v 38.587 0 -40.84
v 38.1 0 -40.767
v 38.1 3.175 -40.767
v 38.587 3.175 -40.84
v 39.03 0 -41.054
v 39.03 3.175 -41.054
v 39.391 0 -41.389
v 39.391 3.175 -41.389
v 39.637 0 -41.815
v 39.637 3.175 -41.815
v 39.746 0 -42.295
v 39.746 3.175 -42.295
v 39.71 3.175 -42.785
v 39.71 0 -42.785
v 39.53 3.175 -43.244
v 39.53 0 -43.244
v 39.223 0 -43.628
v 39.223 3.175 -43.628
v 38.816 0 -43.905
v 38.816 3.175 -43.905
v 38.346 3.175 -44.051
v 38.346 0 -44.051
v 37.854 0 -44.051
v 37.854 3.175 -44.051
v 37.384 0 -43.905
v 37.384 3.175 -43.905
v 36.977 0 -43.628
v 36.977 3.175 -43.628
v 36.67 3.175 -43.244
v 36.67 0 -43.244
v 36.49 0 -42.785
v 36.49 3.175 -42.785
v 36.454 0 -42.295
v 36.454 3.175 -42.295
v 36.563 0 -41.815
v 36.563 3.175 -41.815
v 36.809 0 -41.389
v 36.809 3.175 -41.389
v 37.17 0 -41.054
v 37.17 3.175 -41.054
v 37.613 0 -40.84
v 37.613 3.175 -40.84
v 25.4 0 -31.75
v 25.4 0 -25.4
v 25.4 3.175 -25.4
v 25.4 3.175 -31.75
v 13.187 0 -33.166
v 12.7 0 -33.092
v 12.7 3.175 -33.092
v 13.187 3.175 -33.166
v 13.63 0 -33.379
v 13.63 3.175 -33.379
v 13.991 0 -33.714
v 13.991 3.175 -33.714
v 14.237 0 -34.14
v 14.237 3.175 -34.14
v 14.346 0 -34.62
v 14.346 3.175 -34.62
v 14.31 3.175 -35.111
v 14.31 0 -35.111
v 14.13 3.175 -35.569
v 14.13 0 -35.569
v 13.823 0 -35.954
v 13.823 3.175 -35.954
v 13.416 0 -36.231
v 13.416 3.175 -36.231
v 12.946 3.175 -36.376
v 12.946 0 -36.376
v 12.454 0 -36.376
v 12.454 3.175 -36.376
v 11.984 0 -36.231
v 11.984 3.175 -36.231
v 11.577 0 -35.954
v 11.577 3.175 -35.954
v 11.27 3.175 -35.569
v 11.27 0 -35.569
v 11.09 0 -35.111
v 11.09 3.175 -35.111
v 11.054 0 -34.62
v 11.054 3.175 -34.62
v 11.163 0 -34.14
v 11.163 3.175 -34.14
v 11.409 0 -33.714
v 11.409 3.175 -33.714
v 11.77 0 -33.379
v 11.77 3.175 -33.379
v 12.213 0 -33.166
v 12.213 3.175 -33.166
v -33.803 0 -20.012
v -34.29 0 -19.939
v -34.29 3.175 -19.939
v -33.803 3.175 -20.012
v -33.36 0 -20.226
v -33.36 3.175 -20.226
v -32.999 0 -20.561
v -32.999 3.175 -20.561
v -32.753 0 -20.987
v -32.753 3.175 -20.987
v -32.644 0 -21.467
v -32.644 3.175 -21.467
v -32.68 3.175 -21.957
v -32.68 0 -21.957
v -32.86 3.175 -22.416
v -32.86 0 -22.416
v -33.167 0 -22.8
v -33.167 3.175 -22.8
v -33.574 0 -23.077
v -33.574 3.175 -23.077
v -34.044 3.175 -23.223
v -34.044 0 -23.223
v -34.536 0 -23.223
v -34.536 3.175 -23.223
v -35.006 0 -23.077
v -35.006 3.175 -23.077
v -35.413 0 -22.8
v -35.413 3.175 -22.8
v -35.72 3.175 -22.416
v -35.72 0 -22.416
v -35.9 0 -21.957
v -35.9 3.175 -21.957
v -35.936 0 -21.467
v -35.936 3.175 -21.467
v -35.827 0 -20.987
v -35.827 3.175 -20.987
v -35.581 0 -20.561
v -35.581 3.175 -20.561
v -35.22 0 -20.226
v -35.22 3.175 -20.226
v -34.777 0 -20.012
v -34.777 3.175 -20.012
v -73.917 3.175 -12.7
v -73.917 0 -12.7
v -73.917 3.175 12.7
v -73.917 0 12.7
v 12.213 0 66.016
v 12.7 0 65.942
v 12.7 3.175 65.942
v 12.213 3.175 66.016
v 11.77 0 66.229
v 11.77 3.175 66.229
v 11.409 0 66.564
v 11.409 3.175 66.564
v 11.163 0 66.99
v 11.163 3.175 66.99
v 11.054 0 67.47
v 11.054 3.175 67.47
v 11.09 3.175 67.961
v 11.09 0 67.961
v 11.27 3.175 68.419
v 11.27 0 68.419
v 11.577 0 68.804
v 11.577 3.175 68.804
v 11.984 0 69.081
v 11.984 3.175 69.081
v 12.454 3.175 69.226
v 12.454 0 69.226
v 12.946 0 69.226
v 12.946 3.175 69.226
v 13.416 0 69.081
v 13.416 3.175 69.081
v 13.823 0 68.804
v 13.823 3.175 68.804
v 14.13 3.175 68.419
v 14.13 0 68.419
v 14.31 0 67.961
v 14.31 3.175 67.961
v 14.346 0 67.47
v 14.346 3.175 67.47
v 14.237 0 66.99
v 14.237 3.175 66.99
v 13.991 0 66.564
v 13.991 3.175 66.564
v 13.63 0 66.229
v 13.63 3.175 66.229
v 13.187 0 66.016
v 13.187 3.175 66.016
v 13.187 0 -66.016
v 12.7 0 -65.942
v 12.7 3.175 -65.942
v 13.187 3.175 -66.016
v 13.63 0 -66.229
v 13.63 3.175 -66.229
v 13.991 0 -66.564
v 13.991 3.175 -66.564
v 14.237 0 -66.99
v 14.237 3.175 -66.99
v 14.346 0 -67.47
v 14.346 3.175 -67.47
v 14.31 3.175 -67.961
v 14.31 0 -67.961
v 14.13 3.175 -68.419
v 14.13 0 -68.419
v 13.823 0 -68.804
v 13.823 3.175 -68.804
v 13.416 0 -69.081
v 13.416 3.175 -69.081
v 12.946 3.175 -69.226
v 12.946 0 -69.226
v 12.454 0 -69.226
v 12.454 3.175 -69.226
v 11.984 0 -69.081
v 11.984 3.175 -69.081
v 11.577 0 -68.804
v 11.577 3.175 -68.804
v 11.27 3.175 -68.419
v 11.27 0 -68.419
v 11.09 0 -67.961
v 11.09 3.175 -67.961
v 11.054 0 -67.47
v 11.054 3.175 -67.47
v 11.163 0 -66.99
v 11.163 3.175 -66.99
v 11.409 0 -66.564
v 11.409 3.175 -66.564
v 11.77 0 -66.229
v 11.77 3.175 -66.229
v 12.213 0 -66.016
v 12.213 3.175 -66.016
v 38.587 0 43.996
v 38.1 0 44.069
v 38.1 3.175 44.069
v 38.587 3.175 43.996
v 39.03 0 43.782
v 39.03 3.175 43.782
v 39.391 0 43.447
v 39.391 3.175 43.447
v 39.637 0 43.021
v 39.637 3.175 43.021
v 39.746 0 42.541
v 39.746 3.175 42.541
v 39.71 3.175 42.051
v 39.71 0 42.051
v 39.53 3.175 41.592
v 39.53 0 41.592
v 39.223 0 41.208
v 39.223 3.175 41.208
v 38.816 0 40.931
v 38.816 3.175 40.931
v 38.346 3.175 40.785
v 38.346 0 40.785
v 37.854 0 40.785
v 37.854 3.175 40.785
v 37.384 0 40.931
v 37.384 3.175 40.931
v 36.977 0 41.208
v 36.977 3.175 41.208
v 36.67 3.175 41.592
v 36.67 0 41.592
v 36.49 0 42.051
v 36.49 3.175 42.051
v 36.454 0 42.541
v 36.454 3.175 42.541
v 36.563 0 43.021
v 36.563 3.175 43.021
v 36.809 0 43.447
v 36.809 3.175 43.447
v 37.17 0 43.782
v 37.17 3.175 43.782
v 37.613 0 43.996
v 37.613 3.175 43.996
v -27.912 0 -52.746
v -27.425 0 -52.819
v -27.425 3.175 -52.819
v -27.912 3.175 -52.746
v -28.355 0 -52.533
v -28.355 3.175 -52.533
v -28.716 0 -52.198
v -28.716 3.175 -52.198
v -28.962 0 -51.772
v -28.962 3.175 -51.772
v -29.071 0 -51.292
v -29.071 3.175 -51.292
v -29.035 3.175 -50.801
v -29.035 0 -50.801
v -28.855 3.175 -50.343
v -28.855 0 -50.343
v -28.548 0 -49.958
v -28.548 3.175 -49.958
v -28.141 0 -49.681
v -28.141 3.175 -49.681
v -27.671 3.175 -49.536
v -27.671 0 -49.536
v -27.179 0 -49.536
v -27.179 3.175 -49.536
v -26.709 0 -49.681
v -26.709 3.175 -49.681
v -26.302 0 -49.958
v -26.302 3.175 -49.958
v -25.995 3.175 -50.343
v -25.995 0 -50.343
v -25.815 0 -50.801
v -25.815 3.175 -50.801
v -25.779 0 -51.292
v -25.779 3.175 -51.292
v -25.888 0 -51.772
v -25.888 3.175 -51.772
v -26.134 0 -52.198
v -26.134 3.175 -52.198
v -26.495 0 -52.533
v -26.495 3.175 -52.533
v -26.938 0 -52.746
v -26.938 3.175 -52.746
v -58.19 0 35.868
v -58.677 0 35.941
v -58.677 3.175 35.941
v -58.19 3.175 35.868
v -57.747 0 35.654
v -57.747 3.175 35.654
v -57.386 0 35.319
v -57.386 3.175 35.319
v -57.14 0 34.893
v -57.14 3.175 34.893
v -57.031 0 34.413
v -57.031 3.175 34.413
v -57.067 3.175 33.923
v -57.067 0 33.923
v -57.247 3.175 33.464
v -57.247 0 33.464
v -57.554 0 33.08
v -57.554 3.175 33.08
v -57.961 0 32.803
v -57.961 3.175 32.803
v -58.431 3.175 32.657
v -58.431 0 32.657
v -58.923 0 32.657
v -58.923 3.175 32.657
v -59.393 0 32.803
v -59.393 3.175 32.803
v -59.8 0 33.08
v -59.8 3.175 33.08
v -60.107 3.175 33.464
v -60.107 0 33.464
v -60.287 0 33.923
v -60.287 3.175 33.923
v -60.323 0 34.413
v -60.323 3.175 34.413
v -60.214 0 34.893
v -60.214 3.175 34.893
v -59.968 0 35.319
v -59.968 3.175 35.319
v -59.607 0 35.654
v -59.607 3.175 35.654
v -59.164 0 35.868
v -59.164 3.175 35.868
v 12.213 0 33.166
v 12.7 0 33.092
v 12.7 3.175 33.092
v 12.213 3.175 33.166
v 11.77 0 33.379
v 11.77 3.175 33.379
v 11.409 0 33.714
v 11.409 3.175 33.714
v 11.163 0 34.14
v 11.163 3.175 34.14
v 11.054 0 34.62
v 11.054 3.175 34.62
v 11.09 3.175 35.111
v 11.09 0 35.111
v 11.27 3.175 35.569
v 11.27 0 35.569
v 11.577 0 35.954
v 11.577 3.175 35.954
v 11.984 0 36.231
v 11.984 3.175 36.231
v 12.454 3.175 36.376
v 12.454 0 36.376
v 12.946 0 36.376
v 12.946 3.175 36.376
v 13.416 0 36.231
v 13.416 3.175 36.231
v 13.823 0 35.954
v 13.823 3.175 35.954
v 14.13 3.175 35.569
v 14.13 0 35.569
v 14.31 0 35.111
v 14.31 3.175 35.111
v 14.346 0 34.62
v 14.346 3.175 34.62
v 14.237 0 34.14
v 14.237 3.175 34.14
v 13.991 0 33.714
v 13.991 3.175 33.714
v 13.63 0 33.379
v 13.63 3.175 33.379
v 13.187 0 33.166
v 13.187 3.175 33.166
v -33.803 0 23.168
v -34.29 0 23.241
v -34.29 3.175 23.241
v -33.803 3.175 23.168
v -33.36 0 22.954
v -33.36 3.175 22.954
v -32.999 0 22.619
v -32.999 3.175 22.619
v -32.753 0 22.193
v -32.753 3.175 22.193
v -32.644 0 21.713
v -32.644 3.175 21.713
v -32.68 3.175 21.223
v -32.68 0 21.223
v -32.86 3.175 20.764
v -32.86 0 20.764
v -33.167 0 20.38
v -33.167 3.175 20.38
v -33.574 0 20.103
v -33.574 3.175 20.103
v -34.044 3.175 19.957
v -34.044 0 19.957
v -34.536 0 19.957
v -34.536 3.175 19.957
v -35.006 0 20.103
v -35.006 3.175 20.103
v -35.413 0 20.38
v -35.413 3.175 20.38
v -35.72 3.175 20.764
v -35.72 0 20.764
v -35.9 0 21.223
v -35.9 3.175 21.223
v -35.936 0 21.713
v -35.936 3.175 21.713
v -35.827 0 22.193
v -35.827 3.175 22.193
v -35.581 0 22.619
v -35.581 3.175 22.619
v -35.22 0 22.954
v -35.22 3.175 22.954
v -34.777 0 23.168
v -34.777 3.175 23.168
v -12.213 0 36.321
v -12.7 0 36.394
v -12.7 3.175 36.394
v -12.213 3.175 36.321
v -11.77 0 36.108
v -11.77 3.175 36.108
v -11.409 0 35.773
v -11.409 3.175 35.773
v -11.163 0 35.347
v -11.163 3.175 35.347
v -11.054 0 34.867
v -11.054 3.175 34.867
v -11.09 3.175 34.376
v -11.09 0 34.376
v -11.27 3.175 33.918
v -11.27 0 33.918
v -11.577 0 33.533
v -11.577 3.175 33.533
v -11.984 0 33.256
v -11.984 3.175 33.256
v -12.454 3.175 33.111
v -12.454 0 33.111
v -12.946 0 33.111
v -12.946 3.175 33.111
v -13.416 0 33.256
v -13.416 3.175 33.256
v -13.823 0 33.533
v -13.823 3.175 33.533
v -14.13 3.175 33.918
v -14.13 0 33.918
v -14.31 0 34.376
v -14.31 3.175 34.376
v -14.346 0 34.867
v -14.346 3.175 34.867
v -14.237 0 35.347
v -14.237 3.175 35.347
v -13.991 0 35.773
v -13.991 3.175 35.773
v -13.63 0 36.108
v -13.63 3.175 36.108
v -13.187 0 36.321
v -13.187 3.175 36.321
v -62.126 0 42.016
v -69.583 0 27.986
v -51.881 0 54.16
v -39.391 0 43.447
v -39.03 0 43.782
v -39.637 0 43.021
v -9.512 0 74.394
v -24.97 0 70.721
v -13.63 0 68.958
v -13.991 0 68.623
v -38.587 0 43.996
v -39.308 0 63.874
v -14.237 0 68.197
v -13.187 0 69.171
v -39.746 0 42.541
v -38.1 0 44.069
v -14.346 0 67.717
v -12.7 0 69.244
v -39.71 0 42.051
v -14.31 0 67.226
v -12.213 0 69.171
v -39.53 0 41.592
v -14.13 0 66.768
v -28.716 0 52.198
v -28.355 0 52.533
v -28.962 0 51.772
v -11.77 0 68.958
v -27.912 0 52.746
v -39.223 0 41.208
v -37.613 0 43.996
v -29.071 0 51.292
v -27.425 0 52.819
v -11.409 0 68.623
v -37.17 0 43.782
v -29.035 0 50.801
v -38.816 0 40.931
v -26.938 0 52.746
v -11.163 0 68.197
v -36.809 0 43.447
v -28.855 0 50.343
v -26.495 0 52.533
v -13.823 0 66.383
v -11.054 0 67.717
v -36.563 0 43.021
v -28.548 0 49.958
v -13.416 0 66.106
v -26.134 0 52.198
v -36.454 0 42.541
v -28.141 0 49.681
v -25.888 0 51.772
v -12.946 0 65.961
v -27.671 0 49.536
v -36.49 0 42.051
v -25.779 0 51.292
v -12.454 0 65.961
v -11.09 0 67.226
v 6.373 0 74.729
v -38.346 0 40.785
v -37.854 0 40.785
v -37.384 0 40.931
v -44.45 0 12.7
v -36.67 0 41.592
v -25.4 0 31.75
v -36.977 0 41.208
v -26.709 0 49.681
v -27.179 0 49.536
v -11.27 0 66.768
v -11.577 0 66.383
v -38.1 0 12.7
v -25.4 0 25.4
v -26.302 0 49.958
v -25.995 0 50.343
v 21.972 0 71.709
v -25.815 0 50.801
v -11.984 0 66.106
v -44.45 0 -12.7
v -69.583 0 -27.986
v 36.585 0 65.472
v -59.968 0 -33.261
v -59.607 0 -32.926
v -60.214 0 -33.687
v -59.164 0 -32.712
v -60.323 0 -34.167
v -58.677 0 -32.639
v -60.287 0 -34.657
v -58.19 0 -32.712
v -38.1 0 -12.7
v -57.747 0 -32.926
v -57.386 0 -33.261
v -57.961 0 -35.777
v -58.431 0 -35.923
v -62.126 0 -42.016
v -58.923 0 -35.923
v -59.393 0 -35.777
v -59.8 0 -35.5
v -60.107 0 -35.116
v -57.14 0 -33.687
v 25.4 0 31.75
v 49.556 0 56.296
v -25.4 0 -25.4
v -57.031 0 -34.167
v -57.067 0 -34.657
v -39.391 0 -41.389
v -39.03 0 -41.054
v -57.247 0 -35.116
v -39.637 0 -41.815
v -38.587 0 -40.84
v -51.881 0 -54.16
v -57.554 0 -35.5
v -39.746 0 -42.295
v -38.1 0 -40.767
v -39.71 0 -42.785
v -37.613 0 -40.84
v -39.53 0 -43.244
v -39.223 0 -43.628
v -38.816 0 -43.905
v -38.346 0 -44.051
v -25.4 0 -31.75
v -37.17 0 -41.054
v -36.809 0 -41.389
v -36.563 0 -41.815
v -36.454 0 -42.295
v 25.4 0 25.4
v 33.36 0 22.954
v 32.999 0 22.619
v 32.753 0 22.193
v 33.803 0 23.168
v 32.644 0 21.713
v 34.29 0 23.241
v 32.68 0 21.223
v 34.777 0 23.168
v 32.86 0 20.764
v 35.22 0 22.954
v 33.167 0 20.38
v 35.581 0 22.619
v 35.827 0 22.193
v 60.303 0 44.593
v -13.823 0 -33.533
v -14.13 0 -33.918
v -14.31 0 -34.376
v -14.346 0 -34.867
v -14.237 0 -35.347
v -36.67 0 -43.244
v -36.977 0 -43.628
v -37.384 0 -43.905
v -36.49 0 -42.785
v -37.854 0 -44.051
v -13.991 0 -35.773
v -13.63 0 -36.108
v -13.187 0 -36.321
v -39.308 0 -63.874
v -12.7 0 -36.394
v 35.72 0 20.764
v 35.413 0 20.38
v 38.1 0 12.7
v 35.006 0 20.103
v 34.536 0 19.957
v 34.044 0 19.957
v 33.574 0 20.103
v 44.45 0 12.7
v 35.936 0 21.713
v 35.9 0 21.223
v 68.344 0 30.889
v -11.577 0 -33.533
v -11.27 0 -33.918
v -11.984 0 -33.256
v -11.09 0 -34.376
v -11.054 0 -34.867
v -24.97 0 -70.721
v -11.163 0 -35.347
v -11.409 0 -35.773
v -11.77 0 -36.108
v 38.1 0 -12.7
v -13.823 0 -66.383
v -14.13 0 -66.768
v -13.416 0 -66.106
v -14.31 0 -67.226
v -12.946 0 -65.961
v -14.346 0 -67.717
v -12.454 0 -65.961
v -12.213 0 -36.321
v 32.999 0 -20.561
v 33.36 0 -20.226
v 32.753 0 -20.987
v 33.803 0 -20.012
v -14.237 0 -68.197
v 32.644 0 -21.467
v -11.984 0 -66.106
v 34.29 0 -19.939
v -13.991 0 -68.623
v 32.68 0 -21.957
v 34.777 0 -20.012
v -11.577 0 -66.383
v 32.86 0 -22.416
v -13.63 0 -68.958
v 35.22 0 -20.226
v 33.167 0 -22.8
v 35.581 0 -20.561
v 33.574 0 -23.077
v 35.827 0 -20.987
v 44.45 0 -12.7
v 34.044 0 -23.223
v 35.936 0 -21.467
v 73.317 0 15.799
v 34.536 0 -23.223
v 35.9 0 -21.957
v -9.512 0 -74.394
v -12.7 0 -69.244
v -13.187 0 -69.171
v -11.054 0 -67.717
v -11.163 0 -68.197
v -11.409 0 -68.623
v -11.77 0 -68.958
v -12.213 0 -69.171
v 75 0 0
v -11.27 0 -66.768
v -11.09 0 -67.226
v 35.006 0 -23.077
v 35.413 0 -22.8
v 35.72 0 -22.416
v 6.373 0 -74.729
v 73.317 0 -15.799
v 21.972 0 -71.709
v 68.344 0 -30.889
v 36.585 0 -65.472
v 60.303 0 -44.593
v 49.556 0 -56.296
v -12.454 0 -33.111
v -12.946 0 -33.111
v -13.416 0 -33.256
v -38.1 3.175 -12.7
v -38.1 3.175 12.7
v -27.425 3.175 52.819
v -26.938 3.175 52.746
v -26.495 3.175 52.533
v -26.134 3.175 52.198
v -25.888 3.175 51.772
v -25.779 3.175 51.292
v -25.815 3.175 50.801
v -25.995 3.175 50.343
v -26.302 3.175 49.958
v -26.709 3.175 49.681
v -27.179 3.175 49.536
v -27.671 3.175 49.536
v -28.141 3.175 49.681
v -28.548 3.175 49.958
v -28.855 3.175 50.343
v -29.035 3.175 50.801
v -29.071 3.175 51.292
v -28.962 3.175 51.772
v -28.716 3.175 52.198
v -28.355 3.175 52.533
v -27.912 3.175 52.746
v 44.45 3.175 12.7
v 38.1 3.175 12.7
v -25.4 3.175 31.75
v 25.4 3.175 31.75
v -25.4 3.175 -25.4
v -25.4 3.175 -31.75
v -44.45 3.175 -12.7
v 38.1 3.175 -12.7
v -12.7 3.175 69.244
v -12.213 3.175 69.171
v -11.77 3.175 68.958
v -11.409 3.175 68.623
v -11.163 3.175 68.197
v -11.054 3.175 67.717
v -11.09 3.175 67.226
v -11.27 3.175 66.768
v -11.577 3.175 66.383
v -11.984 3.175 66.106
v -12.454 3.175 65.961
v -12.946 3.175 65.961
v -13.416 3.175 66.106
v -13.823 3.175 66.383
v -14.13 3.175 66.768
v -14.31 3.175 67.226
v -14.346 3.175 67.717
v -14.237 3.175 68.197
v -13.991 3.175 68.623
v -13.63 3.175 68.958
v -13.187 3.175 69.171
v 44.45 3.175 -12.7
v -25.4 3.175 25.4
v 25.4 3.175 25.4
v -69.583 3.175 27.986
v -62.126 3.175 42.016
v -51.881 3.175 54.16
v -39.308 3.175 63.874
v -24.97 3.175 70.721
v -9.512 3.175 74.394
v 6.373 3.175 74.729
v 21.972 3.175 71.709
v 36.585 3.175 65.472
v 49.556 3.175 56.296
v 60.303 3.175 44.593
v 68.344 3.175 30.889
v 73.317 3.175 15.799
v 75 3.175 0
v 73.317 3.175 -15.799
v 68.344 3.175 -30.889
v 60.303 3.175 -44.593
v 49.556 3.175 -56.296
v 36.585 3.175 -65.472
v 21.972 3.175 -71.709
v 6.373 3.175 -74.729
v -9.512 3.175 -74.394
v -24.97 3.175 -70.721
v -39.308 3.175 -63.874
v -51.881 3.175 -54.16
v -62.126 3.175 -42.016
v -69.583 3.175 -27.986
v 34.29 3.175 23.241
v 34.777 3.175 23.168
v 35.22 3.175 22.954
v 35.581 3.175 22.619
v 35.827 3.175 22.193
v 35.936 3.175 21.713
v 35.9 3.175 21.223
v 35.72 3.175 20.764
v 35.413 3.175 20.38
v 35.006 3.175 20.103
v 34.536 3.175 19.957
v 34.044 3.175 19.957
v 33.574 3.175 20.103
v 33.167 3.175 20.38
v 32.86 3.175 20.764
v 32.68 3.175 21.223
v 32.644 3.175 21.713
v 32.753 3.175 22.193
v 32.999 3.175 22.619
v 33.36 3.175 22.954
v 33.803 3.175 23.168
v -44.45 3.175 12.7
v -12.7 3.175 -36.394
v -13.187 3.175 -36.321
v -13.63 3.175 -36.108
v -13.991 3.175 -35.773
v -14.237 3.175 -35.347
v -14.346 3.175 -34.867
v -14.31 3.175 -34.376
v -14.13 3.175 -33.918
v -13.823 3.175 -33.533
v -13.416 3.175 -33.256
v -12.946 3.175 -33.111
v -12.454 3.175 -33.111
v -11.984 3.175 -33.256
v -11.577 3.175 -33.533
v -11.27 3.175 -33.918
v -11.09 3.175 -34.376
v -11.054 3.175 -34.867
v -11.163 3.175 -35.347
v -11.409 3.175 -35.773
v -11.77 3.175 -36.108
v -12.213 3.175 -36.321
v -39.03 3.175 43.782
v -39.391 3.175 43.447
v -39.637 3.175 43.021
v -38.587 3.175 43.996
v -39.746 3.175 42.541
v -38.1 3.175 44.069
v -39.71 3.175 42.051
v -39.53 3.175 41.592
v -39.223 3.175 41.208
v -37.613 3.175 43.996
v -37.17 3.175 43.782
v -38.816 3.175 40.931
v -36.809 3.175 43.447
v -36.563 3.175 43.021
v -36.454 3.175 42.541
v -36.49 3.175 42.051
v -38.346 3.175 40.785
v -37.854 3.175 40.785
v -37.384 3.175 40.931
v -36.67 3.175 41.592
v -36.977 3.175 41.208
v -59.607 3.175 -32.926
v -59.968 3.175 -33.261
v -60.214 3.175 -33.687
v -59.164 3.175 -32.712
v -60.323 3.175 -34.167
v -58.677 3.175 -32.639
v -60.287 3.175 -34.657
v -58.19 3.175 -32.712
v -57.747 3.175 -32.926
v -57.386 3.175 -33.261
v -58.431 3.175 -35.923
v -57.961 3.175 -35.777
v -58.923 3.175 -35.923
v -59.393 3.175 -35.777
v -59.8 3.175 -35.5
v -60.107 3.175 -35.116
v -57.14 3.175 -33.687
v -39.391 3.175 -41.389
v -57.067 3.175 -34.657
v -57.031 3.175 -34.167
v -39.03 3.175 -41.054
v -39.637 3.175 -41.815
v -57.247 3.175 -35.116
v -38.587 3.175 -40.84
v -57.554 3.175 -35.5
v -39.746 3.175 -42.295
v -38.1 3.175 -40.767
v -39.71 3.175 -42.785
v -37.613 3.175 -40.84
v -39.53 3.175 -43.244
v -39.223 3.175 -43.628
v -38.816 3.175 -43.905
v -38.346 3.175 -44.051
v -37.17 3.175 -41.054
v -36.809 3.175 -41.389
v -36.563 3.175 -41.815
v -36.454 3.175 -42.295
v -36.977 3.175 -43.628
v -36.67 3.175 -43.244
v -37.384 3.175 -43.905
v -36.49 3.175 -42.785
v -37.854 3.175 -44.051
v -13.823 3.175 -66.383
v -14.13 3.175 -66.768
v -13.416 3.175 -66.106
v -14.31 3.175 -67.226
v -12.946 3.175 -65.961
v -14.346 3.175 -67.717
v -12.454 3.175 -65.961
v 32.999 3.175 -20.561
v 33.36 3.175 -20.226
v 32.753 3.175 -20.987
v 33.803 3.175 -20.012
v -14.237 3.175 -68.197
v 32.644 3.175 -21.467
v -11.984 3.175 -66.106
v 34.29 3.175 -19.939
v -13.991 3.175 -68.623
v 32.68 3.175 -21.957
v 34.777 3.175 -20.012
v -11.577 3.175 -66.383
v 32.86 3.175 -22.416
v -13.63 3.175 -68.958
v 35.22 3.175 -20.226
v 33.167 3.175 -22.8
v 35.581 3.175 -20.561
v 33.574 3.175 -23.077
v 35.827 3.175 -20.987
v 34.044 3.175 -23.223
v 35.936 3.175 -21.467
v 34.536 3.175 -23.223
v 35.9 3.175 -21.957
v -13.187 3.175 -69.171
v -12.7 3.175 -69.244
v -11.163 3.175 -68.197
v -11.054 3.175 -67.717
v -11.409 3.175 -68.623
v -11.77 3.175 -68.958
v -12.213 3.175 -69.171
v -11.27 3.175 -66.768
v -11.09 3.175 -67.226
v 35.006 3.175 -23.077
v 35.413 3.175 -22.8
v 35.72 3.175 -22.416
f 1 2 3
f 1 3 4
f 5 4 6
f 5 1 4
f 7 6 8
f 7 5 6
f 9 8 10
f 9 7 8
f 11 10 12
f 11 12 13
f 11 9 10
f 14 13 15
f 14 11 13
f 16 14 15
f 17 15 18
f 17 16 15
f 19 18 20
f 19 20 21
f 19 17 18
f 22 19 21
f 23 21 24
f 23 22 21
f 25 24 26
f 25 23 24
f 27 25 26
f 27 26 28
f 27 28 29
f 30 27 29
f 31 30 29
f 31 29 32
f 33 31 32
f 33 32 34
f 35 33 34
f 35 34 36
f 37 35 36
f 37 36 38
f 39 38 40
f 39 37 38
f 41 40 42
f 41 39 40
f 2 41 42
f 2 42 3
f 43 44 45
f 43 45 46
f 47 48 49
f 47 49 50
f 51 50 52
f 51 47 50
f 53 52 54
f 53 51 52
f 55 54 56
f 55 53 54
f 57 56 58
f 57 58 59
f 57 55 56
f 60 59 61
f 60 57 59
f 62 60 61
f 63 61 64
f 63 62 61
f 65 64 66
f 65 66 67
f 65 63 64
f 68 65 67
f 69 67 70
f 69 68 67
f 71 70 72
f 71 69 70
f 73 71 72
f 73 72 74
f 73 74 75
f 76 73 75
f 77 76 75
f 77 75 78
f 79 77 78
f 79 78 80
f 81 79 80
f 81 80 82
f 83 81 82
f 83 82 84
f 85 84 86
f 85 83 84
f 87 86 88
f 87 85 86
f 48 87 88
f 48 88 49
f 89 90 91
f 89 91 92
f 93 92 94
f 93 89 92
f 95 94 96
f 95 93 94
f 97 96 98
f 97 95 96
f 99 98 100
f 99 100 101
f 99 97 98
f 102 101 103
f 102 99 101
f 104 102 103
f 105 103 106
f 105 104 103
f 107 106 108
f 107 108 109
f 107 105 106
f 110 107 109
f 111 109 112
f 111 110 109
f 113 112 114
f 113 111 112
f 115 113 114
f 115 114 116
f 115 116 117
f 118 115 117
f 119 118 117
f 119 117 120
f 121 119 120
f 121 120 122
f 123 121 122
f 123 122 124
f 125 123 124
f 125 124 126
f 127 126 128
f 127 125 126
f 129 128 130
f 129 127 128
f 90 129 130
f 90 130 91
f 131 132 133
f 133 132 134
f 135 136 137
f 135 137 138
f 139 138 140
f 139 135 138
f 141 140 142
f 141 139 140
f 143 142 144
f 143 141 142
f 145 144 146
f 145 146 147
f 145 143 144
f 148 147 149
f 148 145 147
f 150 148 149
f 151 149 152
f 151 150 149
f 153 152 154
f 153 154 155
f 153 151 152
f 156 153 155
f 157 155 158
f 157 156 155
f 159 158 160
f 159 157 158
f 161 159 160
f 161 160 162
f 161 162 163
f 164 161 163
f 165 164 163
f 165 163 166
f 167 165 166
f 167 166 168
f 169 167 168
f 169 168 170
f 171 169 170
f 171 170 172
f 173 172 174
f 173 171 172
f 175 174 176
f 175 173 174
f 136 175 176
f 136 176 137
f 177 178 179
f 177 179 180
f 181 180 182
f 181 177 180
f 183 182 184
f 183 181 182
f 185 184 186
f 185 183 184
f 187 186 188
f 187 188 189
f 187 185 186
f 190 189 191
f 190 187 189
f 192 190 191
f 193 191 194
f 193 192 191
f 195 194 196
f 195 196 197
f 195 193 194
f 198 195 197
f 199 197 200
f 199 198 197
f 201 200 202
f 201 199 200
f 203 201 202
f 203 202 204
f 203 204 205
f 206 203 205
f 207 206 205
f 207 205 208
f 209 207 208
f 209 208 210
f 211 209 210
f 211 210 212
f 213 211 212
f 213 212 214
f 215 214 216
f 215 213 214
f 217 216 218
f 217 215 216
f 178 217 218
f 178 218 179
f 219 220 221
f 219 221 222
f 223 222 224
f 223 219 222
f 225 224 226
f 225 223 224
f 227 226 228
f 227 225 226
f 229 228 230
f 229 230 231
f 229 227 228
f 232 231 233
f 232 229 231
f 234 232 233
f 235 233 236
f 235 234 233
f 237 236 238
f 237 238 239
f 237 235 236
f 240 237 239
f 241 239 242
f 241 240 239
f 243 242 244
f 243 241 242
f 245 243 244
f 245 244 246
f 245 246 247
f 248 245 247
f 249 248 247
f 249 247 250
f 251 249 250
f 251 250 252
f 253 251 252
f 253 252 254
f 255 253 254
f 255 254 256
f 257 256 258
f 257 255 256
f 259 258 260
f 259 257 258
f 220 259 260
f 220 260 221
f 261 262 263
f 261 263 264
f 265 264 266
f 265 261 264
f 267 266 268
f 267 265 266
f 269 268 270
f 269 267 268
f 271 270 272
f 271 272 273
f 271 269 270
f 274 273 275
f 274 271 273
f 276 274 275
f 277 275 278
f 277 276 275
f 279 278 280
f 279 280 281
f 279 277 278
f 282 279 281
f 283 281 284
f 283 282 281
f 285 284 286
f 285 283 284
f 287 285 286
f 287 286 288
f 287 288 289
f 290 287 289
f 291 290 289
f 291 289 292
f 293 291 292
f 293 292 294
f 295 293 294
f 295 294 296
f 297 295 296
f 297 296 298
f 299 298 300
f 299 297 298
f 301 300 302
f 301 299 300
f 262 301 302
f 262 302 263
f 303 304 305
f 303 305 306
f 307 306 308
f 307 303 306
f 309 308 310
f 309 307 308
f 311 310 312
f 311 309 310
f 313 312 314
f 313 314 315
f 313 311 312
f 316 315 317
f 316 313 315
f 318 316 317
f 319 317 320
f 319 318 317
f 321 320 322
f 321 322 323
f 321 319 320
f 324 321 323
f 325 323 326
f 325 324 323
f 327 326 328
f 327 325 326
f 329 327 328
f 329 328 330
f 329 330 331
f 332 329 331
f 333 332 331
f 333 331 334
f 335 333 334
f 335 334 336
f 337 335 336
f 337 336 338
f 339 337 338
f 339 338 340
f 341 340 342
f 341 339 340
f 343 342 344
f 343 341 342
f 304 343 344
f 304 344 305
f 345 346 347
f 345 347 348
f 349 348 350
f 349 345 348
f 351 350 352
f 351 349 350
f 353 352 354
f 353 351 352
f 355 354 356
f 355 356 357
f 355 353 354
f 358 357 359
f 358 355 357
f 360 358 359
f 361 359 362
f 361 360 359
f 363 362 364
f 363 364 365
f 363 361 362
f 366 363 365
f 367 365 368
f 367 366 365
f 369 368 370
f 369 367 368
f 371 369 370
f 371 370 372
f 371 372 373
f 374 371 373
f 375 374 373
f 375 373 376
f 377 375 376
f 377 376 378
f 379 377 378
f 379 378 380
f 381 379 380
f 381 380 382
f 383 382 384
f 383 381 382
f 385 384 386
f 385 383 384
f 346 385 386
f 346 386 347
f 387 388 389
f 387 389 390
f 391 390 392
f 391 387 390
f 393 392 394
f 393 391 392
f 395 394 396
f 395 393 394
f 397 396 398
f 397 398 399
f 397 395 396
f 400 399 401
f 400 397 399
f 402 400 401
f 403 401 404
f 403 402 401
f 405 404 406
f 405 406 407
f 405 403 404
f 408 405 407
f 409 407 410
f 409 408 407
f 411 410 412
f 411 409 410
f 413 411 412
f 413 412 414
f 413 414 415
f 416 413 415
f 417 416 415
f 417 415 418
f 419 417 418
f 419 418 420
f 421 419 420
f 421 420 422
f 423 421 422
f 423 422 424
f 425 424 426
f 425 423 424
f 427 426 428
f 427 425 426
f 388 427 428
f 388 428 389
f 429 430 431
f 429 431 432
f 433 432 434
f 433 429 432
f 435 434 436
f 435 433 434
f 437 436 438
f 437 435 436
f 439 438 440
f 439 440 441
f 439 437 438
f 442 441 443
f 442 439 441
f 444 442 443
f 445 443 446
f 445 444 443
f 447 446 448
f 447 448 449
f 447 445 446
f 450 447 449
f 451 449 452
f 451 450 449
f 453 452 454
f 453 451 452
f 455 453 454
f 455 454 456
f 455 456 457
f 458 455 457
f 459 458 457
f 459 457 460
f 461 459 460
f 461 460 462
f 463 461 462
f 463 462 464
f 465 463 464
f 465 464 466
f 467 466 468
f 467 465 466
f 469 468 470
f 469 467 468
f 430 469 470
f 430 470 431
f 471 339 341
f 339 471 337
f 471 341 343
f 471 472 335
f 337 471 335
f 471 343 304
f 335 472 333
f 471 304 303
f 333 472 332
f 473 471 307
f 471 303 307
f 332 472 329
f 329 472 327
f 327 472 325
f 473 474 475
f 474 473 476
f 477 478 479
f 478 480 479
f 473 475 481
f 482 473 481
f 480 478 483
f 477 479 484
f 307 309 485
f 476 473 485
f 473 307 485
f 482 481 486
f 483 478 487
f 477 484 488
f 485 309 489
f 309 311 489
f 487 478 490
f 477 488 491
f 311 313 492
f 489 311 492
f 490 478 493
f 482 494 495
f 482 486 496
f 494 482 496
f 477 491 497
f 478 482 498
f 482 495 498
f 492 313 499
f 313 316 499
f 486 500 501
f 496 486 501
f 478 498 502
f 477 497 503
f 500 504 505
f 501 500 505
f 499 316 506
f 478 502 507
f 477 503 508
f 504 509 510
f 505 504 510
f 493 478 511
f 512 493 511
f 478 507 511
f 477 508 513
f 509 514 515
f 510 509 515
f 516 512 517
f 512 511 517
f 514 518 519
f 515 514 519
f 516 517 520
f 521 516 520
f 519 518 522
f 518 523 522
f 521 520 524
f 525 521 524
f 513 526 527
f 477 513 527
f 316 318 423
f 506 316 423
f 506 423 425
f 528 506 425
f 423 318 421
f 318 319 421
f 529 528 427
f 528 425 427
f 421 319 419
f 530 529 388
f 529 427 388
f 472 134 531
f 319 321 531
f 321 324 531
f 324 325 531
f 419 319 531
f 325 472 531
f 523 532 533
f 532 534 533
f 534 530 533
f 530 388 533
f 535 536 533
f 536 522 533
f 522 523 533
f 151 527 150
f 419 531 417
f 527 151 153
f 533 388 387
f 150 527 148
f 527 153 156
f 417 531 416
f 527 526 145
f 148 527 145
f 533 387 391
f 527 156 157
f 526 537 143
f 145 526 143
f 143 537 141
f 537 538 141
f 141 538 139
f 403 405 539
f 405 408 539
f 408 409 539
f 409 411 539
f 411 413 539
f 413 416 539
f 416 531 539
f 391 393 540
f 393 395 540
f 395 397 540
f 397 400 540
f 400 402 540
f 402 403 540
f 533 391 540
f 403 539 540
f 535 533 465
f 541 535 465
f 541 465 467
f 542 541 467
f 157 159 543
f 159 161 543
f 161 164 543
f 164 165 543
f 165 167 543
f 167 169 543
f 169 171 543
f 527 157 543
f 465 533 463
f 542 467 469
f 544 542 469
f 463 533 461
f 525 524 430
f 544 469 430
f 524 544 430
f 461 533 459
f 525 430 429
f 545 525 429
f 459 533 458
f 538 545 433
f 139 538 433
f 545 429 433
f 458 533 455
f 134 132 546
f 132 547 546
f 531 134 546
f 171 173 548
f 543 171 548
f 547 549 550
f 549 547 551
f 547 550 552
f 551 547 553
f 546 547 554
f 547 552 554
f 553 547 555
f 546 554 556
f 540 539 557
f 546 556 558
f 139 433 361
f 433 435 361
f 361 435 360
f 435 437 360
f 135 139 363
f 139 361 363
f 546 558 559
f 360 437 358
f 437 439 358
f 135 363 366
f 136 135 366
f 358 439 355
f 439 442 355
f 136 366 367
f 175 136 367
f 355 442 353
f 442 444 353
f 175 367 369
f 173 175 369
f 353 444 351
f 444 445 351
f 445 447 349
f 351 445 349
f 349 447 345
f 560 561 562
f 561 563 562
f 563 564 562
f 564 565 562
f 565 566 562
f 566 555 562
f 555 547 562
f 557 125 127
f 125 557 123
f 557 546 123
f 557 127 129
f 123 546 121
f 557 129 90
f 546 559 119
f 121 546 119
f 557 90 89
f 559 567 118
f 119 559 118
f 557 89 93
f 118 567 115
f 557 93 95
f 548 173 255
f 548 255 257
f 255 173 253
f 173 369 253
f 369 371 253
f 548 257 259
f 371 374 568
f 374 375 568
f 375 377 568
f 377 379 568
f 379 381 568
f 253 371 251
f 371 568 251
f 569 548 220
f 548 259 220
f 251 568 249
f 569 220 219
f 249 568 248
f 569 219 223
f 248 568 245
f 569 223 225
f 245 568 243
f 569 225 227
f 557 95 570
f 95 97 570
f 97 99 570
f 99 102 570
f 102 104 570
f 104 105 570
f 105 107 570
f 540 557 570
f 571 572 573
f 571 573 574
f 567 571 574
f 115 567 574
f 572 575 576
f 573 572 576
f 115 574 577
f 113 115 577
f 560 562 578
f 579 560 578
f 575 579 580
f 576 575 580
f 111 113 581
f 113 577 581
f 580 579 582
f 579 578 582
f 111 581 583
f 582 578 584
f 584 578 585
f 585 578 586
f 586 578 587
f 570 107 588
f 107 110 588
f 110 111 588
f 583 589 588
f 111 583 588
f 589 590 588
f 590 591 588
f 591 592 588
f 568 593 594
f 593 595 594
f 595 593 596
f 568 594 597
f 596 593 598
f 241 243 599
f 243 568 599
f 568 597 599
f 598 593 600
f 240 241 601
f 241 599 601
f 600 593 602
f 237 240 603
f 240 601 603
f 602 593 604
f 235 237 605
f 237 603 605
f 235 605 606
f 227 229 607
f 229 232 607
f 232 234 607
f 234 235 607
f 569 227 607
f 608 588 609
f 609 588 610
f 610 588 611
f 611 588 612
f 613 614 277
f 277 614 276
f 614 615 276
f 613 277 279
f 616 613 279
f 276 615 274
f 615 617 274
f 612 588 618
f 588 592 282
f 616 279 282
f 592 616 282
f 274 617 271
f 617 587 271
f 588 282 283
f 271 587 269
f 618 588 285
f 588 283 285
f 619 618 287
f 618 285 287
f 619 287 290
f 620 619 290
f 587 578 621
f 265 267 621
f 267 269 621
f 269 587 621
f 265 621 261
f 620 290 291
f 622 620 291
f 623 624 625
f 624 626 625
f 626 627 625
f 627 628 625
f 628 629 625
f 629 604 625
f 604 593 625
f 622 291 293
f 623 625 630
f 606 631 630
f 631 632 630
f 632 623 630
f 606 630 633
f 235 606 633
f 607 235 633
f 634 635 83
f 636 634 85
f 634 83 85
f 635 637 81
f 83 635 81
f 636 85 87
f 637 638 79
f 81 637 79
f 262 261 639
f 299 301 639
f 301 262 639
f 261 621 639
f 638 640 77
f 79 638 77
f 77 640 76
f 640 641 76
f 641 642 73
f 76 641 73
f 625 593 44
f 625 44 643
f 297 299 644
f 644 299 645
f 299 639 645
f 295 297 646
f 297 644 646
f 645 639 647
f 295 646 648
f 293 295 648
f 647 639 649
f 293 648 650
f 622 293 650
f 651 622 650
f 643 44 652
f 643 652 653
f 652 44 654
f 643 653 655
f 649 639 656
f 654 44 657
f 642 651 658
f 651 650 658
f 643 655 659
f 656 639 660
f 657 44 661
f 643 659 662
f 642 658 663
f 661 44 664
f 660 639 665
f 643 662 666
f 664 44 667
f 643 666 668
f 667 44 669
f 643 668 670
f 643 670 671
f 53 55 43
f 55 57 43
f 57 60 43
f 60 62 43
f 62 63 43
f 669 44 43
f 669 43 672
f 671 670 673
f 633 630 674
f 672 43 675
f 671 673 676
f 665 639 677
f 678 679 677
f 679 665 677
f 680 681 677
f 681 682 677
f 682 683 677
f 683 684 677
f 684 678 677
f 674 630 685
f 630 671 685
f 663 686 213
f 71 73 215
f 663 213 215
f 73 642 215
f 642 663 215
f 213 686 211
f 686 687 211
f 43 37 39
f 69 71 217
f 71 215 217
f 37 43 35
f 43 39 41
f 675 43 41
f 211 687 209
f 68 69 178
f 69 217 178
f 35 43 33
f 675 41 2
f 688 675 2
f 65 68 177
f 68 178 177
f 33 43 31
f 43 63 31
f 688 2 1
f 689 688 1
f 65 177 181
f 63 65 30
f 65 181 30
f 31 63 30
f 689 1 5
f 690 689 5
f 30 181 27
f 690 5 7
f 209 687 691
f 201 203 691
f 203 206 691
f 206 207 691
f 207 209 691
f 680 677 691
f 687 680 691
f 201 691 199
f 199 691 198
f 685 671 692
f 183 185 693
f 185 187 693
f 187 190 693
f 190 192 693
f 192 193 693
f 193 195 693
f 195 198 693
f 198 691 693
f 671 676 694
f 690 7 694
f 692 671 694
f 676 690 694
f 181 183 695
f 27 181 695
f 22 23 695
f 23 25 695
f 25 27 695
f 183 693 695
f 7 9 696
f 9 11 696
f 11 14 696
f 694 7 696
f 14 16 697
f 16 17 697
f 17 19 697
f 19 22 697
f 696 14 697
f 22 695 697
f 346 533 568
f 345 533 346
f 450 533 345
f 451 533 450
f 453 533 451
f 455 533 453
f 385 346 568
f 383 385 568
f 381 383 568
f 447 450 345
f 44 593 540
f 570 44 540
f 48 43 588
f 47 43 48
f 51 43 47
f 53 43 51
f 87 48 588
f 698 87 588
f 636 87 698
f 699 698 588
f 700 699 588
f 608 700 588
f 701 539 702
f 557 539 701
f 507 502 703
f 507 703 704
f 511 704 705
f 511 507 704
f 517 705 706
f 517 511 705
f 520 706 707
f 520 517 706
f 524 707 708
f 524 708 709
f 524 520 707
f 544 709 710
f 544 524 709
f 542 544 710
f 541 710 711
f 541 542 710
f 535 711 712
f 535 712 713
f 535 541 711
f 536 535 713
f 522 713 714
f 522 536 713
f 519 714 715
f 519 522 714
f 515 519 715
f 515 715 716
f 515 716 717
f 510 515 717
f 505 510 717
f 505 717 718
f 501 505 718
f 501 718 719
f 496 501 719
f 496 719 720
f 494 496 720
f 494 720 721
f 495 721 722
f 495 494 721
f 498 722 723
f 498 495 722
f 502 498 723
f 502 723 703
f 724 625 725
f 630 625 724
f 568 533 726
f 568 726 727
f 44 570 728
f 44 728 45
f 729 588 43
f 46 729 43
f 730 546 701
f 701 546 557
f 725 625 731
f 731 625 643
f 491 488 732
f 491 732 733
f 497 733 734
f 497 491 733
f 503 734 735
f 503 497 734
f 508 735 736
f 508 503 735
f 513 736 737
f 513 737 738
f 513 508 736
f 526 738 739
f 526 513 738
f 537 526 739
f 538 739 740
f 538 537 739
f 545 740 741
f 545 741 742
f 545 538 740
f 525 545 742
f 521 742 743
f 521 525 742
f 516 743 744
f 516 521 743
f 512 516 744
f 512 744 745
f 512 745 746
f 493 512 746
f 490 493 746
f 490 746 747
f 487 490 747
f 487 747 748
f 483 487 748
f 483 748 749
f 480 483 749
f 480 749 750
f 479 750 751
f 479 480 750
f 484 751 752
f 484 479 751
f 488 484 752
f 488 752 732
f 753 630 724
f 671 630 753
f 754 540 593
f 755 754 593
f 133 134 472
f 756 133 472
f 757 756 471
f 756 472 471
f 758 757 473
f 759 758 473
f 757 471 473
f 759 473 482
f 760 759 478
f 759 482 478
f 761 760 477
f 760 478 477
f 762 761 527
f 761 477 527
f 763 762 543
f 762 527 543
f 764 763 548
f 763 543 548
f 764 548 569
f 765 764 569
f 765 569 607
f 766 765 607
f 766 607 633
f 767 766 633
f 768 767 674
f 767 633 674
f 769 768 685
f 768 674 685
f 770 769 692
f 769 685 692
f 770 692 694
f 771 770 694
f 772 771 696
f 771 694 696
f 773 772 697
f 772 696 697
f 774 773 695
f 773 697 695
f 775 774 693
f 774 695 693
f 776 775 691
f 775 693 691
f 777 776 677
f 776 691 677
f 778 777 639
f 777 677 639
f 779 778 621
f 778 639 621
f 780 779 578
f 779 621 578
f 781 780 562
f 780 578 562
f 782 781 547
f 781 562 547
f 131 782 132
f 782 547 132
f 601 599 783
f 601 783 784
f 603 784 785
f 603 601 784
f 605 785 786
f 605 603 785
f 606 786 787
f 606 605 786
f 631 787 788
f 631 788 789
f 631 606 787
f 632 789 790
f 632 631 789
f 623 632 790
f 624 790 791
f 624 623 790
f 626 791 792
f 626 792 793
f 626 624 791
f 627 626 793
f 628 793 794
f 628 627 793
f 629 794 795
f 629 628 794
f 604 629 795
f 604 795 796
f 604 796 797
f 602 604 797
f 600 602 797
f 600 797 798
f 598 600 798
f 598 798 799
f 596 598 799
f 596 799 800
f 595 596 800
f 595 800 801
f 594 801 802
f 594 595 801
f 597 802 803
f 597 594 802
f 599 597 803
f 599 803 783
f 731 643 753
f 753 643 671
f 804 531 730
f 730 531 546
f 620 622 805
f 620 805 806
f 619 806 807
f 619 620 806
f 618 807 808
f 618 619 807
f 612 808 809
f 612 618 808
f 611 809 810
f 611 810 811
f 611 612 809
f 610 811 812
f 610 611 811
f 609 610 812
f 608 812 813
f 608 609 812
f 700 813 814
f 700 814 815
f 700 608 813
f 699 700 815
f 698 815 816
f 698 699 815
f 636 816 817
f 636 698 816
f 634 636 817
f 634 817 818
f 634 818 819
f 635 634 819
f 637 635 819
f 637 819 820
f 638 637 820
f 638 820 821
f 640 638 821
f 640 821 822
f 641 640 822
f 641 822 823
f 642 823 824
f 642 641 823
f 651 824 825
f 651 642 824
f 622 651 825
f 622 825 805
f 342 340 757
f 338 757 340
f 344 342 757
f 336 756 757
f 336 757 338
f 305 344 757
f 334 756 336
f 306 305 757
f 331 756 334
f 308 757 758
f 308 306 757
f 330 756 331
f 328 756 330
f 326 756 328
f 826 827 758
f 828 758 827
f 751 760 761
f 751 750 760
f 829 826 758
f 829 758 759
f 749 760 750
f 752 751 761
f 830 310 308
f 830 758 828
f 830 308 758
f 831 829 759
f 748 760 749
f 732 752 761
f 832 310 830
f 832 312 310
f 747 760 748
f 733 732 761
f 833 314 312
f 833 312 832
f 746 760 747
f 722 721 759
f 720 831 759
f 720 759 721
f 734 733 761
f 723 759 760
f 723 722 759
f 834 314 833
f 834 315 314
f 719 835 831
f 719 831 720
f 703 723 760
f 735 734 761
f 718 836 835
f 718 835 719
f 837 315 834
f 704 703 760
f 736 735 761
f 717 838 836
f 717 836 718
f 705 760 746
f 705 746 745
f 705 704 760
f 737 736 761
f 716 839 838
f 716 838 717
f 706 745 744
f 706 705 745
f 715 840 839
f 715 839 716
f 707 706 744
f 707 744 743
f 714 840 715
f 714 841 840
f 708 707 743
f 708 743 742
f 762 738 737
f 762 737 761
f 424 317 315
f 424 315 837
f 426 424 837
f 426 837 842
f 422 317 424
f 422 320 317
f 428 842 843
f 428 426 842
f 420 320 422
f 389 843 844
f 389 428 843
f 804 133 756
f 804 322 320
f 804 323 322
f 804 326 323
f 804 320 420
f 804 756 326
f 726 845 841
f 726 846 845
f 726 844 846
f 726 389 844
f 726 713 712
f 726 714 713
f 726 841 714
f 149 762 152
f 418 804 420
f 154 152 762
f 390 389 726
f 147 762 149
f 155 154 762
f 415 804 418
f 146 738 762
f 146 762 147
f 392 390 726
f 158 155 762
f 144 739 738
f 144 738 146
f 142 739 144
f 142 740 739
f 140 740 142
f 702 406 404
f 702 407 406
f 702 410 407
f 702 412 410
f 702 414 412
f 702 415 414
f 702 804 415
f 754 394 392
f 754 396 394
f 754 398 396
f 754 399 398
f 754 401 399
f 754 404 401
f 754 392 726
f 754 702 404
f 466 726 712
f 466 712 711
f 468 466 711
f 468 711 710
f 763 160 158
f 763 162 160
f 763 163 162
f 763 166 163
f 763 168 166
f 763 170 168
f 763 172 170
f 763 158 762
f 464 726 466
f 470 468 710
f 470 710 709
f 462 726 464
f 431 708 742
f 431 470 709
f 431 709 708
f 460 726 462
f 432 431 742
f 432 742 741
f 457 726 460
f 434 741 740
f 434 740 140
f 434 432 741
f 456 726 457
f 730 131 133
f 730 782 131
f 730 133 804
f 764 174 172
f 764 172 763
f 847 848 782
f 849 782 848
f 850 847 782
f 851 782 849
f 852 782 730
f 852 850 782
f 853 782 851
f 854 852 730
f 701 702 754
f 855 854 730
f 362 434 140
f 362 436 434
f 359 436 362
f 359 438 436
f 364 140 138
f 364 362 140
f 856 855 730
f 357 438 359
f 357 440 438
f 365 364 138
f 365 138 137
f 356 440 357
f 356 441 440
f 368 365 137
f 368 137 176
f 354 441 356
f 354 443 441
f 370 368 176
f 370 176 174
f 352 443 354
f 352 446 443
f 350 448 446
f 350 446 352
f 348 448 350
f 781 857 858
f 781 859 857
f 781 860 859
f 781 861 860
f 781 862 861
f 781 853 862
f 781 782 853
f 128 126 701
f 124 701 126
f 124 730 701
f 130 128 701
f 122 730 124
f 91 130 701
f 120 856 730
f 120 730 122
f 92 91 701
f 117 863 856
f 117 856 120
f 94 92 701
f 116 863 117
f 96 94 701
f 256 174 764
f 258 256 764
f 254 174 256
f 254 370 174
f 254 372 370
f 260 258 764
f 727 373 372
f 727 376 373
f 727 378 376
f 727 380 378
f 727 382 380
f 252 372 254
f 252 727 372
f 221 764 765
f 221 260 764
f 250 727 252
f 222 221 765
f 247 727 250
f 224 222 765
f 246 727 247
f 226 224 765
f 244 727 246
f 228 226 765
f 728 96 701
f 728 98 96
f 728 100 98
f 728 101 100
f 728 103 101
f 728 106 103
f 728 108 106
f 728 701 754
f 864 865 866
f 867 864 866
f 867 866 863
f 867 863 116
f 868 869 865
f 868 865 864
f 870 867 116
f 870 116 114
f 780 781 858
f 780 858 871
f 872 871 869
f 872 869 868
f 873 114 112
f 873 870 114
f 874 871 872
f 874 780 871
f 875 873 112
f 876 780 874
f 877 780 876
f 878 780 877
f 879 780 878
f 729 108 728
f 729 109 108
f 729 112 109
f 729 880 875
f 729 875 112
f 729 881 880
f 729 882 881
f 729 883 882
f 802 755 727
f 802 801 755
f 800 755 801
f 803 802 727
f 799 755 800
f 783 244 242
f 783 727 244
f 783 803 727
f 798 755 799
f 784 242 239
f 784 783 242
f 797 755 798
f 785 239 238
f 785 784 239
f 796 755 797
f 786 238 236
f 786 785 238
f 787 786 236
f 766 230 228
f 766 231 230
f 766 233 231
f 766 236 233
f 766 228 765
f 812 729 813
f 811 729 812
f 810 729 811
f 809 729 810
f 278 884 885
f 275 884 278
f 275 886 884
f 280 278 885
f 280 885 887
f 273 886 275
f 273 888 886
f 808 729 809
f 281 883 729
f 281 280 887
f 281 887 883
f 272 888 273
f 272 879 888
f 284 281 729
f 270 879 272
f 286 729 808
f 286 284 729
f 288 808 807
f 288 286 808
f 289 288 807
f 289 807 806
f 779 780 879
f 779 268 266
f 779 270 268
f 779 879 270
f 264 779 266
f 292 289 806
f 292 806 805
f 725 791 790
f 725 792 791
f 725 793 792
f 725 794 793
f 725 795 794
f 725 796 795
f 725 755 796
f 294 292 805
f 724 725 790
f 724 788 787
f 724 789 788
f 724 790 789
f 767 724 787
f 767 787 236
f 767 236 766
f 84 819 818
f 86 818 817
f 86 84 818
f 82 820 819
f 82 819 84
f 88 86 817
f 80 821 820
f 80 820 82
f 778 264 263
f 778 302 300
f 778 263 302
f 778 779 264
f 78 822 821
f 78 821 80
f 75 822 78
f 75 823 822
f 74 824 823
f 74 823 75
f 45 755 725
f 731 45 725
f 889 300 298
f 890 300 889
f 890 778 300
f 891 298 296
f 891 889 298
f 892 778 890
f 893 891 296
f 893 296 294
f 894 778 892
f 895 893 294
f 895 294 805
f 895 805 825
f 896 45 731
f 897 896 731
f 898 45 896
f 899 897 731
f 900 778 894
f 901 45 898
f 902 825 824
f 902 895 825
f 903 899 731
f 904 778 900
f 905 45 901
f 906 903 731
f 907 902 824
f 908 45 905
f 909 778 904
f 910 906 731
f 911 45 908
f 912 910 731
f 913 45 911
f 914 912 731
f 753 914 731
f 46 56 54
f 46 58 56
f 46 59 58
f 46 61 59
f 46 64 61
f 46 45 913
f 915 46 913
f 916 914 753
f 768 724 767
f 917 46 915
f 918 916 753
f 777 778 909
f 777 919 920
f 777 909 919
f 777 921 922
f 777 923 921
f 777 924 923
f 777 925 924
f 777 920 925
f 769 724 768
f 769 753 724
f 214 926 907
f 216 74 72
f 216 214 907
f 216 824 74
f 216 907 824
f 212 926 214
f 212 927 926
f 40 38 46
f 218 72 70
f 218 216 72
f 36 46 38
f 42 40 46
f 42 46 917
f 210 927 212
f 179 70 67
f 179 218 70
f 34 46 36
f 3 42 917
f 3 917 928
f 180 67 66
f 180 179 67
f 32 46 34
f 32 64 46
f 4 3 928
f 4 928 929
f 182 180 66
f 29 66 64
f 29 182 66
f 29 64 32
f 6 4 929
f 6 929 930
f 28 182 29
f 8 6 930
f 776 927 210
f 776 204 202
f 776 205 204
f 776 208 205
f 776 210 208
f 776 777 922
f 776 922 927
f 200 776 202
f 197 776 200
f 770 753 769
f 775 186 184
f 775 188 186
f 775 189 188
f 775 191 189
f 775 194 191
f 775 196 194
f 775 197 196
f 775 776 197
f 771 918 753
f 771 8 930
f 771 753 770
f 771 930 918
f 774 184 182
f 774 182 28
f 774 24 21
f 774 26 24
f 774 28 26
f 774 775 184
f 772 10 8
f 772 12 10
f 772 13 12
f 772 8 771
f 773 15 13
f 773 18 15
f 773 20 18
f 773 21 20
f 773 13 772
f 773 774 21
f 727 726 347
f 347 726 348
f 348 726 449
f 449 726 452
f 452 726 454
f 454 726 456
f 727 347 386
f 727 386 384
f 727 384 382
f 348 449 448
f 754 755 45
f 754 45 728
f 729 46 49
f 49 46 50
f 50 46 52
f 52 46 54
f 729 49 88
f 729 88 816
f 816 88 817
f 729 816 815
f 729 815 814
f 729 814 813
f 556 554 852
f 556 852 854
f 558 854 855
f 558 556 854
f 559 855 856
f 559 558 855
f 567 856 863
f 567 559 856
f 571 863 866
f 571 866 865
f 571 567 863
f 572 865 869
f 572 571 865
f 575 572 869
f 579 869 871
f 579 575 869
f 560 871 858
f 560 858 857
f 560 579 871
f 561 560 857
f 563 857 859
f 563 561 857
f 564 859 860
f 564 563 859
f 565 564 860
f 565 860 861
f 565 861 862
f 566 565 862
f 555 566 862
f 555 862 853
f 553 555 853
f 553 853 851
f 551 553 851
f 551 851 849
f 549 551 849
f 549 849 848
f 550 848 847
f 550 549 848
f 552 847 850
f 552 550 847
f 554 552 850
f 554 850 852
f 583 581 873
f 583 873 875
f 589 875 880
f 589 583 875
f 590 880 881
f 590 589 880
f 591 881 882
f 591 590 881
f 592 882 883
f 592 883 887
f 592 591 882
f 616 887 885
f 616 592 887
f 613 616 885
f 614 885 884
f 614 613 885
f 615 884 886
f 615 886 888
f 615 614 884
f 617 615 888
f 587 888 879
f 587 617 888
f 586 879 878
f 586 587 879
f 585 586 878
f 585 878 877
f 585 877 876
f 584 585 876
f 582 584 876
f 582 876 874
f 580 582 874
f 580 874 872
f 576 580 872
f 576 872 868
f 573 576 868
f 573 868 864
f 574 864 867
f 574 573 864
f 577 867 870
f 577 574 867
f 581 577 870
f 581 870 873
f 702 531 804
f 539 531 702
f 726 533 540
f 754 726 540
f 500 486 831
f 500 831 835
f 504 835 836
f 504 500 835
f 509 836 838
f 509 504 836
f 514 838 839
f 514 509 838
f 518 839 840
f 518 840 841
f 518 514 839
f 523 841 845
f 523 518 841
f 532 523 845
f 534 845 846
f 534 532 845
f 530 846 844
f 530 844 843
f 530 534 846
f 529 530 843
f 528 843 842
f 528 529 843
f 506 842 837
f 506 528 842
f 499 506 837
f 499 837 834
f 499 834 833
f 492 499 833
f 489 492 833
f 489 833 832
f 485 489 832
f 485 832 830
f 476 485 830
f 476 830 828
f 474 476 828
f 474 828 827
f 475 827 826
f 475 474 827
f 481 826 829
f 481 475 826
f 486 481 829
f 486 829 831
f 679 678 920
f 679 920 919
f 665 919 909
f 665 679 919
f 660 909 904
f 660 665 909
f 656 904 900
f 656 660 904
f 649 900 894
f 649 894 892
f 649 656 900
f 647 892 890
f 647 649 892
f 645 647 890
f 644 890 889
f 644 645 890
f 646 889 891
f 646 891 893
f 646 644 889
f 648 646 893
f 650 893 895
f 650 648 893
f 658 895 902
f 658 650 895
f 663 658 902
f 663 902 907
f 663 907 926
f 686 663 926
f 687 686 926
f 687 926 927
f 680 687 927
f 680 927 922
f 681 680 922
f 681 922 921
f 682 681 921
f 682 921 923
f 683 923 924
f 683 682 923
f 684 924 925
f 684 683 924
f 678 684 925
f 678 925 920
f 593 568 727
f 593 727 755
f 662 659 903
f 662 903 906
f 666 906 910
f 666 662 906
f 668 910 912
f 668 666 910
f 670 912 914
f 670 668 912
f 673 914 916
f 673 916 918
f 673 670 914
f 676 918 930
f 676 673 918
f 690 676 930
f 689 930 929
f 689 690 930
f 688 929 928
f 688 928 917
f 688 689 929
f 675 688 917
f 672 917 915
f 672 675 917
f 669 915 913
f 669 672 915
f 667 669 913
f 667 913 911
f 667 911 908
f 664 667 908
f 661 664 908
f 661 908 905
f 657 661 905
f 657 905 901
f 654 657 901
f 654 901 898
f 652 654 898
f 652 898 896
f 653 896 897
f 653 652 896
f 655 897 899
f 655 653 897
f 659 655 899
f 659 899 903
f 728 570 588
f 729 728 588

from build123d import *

# Parameters (mm, degrees)
SKETCH1_R           = 1.651
SKETCH1_W           = 50.8
SKETCH1_H           = 6.35
SKETCH1_W_2         = 6.35
SKETCH1_H_2         = 25.4
BOSS_EXTRUDE1_DEPTH = 3.175


with BuildPart() as part:
    # Sketch1 → Boss-Extrude1 (new body)
    with BuildSketch(Plane(origin=(0, 0, 0), x_dir=(1, 0, 0), z_dir=(0, 1, 0))):
        with BuildLine():
            Line((-73.916912814, 12.7), (-73.916912814, -12.7))
            ThreePointArc((-73.916912814, -12.7), (75, 0), (-73.916912814, 12.7))
        make_face()
        with Locations(Location((-34.29, 21.59, 0), (0, 0, 270))):
            Circle(SKETCH1_R, mode=Mode.SUBTRACT)
        with Locations(Location((34.29, 21.59, 0), (0, 0, 270))):
            Circle(SKETCH1_R, mode=Mode.SUBTRACT)
        with Locations(Location((-34.29, -21.59, 0), (0, 0, 270))):
            Circle(SKETCH1_R, mode=Mode.SUBTRACT)
        with Locations(Location((34.29, -21.59, 0), (0, 0, 270))):
            Circle(SKETCH1_R, mode=Mode.SUBTRACT)
        with Locations(Location((38.1, -42.418, 0), (0, 0, 270))):
            Circle(SKETCH1_R, mode=Mode.SUBTRACT)
        with Locations(Location((-38.1, -42.418, 0), (0, 0, 270))):
            Circle(SKETCH1_R, mode=Mode.SUBTRACT)
        with Locations(Location((-58.676912814, -34.29, 0), (0, 0, 270))):
            Circle(SKETCH1_R, mode=Mode.SUBTRACT)
        with Locations(Location((-58.676912814, 34.29, 0), (0, 0, 270))):
            Circle(SKETCH1_R, mode=Mode.SUBTRACT)
        with Locations(Location((-38.1, 42.418, 0), (0, 0, 270))):
            Circle(SKETCH1_R, mode=Mode.SUBTRACT)
        with Locations(Location((38.1, 42.418, 0), (0, 0, 270))):
            Circle(SKETCH1_R, mode=Mode.SUBTRACT)
        with Locations(Location((12.7, -67.593386492, 0), (0, 0, 90))):
            Circle(SKETCH1_R, mode=Mode.SUBTRACT)
        with Locations(Location((12.7, -34.743386492, 0), (0, 0, 90))):
            Circle(SKETCH1_R, mode=Mode.SUBTRACT)
        with Locations(Location((12.7, 34.743386492, 0), (0, 0, 270))):
            Circle(SKETCH1_R, mode=Mode.SUBTRACT)
        with Locations(Location((12.7, 67.593386492, 0), (0, 0, 270))):
            Circle(SKETCH1_R, mode=Mode.SUBTRACT)
        with Locations(Location((-27.425, -51.168386492, 0), (0, 0, 270))):
            Circle(SKETCH1_R, mode=Mode.SUBTRACT)
        with Locations(Location((-12.7, -34.743386492, 0), (0, 0, 270))):
            Circle(SKETCH1_R, mode=Mode.SUBTRACT)
        with Locations(Location((-12.7, -67.593386492, 0), (0, 0, 270))):
            Circle(SKETCH1_R, mode=Mode.SUBTRACT)
        with Locations(Location((-12.7, 67.593386492, 0), (0, 0, 90))):
            Circle(SKETCH1_R, mode=Mode.SUBTRACT)
        with Locations(Location((-27.425, 51.168386492, 0), (0, 0, 90))):
            Circle(SKETCH1_R, mode=Mode.SUBTRACT)
        with Locations(Location((-12.7, 34.743386492, 0), (0, 0, 90))):
            Circle(SKETCH1_R, mode=Mode.SUBTRACT)
        with Locations((0, 28.575)):
            Rectangle(SKETCH1_W, SKETCH1_H, mode=Mode.SUBTRACT)
        with Locations((41.275, 0)):
            Rectangle(SKETCH1_W_2, SKETCH1_H_2, mode=Mode.SUBTRACT)
        with Locations((0, -28.575)):
            Rectangle(SKETCH1_W, SKETCH1_H, mode=Mode.SUBTRACT)
        with Locations((-41.275, 0)):
            Rectangle(SKETCH1_W_2, SKETCH1_H_2, mode=Mode.SUBTRACT)
    extrude(amount=BOSS_EXTRUDE1_DEPTH)


solid = part.part
